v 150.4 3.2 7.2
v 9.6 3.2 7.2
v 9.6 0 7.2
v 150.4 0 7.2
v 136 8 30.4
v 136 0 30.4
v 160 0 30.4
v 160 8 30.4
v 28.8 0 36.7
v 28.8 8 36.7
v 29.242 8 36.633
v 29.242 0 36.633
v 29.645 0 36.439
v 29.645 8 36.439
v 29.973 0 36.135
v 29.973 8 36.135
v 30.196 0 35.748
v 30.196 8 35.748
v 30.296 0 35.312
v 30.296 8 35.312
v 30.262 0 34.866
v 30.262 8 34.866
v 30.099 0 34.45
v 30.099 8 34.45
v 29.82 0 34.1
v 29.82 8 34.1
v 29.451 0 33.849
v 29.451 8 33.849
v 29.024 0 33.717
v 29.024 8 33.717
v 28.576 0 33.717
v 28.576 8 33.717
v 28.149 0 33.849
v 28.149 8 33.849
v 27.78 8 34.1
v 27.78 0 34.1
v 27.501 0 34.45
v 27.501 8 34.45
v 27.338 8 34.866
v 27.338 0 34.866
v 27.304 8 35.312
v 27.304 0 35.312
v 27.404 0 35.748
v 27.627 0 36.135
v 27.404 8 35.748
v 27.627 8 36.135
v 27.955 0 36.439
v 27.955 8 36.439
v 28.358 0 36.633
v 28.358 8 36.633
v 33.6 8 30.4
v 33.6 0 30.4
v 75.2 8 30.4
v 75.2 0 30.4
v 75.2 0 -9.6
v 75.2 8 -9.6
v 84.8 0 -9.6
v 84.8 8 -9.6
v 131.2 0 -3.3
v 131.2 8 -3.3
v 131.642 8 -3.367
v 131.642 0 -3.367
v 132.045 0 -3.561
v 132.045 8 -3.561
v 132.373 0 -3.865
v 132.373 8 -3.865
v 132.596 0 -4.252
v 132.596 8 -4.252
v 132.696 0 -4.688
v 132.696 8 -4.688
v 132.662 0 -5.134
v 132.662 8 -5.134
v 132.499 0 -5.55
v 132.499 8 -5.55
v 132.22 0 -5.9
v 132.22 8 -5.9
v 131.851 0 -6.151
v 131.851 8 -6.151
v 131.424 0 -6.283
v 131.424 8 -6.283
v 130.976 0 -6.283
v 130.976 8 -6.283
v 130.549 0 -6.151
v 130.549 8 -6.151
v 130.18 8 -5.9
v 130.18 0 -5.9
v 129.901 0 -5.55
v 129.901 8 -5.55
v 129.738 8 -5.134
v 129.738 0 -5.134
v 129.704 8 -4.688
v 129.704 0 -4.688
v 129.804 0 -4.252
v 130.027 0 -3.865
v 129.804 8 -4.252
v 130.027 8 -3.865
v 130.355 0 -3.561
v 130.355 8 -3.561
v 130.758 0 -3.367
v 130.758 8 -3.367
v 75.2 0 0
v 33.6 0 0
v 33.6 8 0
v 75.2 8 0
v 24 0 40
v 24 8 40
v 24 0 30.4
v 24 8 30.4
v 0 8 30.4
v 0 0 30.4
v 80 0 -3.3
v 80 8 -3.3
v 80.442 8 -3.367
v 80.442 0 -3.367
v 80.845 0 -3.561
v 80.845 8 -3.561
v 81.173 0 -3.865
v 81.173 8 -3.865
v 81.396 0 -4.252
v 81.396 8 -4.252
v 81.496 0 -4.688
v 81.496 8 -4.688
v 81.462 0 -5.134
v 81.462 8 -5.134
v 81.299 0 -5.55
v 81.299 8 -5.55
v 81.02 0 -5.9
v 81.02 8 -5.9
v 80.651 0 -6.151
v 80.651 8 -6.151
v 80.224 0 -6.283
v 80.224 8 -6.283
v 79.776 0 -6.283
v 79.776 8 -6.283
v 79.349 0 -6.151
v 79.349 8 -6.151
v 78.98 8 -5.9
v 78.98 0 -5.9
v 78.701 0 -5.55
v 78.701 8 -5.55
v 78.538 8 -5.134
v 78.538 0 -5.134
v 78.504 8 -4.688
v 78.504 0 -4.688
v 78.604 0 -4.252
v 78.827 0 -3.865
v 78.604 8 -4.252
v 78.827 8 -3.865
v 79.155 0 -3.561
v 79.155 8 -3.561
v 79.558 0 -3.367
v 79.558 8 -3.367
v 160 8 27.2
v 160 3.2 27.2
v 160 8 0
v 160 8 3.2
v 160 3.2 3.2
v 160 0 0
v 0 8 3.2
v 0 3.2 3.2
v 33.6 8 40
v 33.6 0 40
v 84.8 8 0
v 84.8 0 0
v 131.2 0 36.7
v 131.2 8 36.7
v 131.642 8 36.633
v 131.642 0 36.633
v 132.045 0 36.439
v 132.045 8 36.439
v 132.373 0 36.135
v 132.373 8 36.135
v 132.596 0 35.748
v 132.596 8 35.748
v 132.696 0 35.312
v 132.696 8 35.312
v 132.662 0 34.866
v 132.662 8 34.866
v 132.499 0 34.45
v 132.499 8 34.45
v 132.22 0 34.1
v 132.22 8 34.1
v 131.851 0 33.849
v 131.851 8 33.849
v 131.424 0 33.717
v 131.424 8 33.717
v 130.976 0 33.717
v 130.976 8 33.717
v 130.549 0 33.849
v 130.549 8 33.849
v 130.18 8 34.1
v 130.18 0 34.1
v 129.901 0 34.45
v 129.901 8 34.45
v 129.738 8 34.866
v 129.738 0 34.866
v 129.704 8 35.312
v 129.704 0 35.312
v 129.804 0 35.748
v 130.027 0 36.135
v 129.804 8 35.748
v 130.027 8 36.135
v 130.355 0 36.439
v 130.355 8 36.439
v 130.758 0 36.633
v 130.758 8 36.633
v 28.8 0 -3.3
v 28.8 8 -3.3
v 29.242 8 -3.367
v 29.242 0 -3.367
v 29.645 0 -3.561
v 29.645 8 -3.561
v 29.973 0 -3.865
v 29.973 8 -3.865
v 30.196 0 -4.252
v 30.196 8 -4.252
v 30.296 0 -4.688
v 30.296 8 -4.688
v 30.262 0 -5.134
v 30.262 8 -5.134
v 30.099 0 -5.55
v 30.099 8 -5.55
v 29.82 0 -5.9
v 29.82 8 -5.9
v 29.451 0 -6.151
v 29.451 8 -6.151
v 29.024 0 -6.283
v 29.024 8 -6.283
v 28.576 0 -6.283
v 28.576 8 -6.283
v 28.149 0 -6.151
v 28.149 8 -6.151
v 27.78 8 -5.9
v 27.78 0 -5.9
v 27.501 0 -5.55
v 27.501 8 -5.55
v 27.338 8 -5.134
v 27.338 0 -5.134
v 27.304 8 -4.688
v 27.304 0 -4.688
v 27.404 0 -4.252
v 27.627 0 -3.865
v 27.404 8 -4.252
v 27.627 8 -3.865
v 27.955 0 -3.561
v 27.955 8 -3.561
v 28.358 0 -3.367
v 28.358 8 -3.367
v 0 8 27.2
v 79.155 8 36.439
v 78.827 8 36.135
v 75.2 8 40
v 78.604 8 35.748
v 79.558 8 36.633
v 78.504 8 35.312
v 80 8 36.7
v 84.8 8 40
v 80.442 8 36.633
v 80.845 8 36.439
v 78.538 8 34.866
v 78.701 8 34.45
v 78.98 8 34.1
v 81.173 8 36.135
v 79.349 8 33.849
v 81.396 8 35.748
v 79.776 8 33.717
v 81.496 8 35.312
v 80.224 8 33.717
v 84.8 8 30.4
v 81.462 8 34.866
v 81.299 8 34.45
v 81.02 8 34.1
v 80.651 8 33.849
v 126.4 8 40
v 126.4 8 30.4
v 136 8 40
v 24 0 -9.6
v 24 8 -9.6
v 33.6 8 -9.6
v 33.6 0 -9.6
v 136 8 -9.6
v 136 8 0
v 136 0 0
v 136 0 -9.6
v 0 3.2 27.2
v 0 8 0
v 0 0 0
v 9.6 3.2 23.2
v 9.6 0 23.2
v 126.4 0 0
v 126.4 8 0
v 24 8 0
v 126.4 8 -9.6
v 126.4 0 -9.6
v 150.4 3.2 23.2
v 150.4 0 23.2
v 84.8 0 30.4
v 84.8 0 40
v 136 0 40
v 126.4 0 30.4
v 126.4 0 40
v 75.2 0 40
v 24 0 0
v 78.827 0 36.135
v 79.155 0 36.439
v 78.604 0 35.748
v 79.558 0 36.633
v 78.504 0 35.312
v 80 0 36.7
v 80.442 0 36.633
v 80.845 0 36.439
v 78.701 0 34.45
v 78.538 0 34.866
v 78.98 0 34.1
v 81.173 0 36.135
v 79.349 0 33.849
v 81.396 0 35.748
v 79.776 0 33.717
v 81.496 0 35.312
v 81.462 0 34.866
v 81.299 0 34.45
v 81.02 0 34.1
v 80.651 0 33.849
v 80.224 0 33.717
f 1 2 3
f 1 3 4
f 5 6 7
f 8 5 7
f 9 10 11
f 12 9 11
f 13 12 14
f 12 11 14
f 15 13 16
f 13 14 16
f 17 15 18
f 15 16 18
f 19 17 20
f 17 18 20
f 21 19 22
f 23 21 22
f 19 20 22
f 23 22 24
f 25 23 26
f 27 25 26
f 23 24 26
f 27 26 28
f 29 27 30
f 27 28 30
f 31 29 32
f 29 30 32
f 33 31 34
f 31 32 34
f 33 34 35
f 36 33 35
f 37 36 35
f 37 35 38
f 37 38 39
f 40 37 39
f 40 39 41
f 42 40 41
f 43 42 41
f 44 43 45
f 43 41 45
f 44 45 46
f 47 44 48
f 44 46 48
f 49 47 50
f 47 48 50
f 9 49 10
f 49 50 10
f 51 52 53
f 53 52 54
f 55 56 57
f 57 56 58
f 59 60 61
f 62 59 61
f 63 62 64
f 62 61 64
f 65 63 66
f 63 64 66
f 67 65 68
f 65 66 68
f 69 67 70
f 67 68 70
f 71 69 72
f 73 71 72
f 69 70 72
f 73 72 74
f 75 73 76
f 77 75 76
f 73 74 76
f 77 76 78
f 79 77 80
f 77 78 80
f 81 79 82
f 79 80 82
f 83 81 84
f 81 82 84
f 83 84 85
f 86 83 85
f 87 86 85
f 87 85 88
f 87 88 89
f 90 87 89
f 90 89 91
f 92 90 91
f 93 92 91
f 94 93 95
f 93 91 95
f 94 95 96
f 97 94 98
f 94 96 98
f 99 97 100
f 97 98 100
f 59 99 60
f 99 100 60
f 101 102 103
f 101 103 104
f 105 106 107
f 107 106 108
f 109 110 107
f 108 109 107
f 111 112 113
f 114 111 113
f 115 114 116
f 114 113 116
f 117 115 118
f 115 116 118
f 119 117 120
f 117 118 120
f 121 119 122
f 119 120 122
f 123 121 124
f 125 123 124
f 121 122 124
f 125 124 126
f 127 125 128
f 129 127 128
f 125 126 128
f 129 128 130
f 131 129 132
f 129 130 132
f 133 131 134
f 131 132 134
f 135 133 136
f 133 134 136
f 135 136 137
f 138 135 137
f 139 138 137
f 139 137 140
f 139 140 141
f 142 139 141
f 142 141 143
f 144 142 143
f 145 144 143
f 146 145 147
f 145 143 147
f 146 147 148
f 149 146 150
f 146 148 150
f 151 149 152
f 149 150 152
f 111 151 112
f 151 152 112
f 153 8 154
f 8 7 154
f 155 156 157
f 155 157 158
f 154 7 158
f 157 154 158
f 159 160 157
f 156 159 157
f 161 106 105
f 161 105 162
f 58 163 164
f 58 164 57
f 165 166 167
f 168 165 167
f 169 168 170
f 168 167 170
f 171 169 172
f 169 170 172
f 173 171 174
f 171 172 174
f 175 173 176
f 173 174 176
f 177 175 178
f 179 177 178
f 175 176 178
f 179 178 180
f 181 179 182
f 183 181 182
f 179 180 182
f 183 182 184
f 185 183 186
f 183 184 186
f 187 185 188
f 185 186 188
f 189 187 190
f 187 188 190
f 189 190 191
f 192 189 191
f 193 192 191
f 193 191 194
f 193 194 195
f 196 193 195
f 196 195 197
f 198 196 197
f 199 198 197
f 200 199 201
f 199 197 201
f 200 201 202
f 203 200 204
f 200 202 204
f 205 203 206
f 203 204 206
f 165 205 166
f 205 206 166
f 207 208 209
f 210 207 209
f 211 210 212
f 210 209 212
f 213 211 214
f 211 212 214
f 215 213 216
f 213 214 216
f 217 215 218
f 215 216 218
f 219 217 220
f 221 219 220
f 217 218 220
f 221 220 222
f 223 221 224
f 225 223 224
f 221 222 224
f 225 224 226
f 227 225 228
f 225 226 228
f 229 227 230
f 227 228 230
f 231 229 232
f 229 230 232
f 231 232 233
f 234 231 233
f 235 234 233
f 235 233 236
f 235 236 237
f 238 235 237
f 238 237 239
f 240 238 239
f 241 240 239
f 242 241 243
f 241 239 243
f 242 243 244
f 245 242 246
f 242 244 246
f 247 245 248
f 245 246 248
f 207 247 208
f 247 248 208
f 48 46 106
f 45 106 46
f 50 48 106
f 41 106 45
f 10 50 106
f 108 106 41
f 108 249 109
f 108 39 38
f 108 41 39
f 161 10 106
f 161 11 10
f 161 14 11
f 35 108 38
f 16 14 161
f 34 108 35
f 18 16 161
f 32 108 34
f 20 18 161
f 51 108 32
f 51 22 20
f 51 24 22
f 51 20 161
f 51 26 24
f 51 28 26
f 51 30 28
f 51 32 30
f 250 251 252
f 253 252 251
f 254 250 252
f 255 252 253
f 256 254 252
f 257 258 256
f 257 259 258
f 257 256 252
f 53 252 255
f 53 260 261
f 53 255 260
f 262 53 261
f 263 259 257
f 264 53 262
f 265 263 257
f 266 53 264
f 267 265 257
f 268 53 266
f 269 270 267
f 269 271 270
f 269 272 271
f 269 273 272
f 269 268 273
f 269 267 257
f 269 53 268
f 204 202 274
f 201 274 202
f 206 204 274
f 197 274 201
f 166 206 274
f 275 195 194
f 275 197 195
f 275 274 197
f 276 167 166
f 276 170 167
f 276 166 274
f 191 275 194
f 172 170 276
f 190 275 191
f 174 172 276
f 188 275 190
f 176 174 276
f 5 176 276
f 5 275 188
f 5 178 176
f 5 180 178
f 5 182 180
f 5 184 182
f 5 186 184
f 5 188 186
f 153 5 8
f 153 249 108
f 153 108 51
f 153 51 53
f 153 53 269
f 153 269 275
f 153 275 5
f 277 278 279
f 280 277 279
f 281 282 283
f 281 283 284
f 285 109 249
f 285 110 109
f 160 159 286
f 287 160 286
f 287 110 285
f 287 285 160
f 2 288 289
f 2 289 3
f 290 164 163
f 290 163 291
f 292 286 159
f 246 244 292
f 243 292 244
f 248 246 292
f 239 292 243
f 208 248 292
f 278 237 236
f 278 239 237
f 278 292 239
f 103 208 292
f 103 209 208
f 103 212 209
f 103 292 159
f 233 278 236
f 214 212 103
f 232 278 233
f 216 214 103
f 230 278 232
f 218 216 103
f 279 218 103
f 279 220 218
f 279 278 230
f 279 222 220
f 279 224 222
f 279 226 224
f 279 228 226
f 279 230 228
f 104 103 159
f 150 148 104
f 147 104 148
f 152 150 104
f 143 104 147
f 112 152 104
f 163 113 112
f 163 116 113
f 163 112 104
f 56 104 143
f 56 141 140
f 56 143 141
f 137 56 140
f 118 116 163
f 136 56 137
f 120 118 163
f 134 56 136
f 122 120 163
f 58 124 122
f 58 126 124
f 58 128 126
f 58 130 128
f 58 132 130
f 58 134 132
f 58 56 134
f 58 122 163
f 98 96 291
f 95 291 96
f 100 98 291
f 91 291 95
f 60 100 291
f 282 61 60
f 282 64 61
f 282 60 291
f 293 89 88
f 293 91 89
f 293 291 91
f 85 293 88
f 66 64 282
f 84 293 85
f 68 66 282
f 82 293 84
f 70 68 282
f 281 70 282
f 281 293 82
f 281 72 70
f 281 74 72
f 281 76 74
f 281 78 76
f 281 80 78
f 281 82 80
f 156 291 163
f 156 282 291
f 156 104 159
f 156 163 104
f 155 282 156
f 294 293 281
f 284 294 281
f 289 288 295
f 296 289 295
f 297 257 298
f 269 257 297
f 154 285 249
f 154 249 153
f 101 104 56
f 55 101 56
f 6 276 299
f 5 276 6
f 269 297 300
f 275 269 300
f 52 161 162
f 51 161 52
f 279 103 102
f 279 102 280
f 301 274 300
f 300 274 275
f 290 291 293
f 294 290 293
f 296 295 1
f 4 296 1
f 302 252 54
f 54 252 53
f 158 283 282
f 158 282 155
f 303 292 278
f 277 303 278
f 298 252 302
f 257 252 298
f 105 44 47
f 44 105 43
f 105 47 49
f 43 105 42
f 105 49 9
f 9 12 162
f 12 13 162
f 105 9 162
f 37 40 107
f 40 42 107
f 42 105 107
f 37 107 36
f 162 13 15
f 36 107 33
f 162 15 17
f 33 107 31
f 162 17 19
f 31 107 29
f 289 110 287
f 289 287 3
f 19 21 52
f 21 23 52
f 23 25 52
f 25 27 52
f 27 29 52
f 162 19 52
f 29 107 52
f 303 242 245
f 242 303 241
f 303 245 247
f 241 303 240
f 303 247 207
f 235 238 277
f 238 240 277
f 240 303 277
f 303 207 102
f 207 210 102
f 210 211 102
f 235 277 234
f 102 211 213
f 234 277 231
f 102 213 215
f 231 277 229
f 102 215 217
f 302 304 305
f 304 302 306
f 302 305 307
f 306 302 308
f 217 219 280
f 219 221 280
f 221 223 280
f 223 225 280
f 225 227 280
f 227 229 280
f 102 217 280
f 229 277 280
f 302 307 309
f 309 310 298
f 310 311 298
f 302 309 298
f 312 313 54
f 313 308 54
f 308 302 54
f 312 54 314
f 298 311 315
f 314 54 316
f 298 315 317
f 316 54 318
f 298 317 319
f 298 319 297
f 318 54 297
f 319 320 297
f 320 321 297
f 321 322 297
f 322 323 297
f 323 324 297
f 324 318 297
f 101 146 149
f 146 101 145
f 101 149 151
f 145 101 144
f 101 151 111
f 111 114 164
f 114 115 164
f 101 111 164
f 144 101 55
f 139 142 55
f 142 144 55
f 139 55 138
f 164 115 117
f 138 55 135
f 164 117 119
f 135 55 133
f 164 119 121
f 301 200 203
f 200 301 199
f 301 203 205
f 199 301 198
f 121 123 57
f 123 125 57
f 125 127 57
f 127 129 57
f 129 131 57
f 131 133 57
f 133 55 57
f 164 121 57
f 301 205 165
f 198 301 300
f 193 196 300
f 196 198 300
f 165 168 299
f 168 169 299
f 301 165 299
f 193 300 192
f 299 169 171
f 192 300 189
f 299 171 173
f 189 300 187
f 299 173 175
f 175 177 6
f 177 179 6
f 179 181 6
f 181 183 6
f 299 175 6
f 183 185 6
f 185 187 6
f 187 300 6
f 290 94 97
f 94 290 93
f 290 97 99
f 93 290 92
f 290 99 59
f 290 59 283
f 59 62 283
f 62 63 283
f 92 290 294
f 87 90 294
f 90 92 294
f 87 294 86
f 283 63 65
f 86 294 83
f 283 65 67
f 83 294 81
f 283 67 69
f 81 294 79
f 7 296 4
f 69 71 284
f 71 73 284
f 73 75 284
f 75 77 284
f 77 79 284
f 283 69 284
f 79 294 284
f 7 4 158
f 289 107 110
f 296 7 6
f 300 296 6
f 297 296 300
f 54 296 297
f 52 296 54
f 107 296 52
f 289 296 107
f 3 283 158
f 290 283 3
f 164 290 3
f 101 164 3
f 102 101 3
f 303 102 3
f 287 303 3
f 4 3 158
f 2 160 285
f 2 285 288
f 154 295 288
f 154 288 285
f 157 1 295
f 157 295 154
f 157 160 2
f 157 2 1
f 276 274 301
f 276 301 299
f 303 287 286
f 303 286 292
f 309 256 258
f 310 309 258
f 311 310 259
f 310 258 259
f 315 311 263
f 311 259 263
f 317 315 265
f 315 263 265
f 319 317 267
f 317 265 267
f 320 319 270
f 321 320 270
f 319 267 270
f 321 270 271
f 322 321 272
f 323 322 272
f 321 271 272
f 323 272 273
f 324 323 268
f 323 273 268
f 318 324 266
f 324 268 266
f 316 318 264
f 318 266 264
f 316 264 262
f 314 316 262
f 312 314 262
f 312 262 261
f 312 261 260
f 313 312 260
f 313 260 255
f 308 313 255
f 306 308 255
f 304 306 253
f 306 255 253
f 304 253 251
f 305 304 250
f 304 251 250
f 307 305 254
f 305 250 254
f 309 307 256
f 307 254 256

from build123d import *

# Parameters (mm, degrees)
SKETCH1_W           = 160
SKETCH1_H           = 30.4
BOSS_EXTRUDE1_DEPTH = 3.2
SKETCH2_W           = 160
SKETCH2_H           = 3.2
BOSS_EXTRUDE2_DEPTH = 4.8
SKETCH3_W           = 140.8
SKETCH3_H           = 16
CUT_EXTRUDE1_DEPTH  = 163.933115112
SKETCH4_W           = 9.6
SKETCH4_H           = 9.6
SKETCH4_R           = 1.5
BOSS_EXTRUDE3_DEPTH = 8


with BuildPart() as part:
    # Sketch1 → Boss-Extrude1 (new body)
    with BuildSketch(Plane(origin=(0, 0, 0), x_dir=(1, 0, 0), z_dir=(0, 1, 0))):
        with Locations((80, -15.2)):
            Rectangle(SKETCH1_W, SKETCH1_H)
    extrude(amount=BOSS_EXTRUDE1_DEPTH)

    # Sketch2 → Boss-Extrude2 (add)
    with BuildSketch(Plane(origin=(0, 3.2, 0), x_dir=(1, 0, 0), z_dir=(0, 1, 0))):
        with Locations((80, -28.8)):
            Rectangle(SKETCH2_W, SKETCH2_H)
        with Locations((80, -1.6)):
            Rectangle(SKETCH2_W, SKETCH2_H)
    extrude(amount=BOSS_EXTRUDE2_DEPTH)

    # Sketch3 → Cut-Extrude1 (cut, through all)
    with BuildSketch(Plane(origin=(0, 3.2, 0), x_dir=(1, 0, 0), z_dir=(0, 1, 0))):
        with Locations((80, -15.2)):
            Rectangle(SKETCH3_W, SKETCH3_H)
    extrude(amount=-CUT_EXTRUDE1_DEPTH, mode=Mode.SUBTRACT)

    # Sketch4 → Boss-Extrude3 (add)
    # profile 1 of 6: a face of its own
    with BuildSketch(Plane(origin=(0, 8, 0), x_dir=(1, 0, 0), z_dir=(0, 1, 0))):
        with Locations((28.8, -35.2)):
            Rectangle(SKETCH4_W, SKETCH4_H)
        with Locations(Location((28.8, -35.2, 0), (0, 0, 270))):
            Circle(SKETCH4_R, mode=Mode.SUBTRACT)
    # profile 2 of 6: a face of its own
    with BuildSketch(Plane(origin=(0, 8, 0), x_dir=(1, 0, 0), z_dir=(0, 1, 0))):
        with Locations((80, -35.2)):
            Rectangle(SKETCH4_W, SKETCH4_H)
        with Locations(Location((80, -35.2, 0), (0, 0, 270))):
            Circle(SKETCH4_R, mode=Mode.SUBTRACT)
    # profile 3 of 6: a face of its own
    with BuildSketch(Plane(origin=(0, 8, 0), x_dir=(1, 0, 0), z_dir=(0, 1, 0))):
        with Locations((131.2, -35.2)):
            Rectangle(SKETCH4_W, SKETCH4_H)
        with Locations(Location((131.2, -35.2, 0), (0, 0, 270))):
            Circle(SKETCH4_R, mode=Mode.SUBTRACT)
    # profile 4 of 6: a face of its own
    with BuildSketch(Plane(origin=(0, 8, 0), x_dir=(1, 0, 0), z_dir=(0, 1, 0))):
        with Locations((80, 4.8)):
            Rectangle(SKETCH4_W, SKETCH4_H)
        with Locations(Location((80, 4.8, 0), (0, 0, 270))):
            Circle(SKETCH4_R, mode=Mode.SUBTRACT)
    # profile 5 of 6: a face of its own
    with BuildSketch(Plane(origin=(0, 8, 0), x_dir=(1, 0, 0), z_dir=(0, 1, 0))):
        with Locations((131.2, 4.8)):
            Rectangle(SKETCH4_W, SKETCH4_H)
        with Locations(Location((131.2, 4.8, 0), (0, 0, 270))):
            Circle(SKETCH4_R, mode=Mode.SUBTRACT)
    # profile 6 of 6: a face of its own
    with BuildSketch(Plane(origin=(0, 8, 0), x_dir=(1, 0, 0), z_dir=(0, 1, 0))):
        with Locations((28.8, 4.8)):
            Rectangle(SKETCH4_W, SKETCH4_H)
        with Locations(Location((28.8, 4.8, 0), (0, 0, 270))):
            Circle(SKETCH4_R, mode=Mode.SUBTRACT)
    extrude(amount=-BOSS_EXTRUDE3_DEPTH)


solid = part.part
